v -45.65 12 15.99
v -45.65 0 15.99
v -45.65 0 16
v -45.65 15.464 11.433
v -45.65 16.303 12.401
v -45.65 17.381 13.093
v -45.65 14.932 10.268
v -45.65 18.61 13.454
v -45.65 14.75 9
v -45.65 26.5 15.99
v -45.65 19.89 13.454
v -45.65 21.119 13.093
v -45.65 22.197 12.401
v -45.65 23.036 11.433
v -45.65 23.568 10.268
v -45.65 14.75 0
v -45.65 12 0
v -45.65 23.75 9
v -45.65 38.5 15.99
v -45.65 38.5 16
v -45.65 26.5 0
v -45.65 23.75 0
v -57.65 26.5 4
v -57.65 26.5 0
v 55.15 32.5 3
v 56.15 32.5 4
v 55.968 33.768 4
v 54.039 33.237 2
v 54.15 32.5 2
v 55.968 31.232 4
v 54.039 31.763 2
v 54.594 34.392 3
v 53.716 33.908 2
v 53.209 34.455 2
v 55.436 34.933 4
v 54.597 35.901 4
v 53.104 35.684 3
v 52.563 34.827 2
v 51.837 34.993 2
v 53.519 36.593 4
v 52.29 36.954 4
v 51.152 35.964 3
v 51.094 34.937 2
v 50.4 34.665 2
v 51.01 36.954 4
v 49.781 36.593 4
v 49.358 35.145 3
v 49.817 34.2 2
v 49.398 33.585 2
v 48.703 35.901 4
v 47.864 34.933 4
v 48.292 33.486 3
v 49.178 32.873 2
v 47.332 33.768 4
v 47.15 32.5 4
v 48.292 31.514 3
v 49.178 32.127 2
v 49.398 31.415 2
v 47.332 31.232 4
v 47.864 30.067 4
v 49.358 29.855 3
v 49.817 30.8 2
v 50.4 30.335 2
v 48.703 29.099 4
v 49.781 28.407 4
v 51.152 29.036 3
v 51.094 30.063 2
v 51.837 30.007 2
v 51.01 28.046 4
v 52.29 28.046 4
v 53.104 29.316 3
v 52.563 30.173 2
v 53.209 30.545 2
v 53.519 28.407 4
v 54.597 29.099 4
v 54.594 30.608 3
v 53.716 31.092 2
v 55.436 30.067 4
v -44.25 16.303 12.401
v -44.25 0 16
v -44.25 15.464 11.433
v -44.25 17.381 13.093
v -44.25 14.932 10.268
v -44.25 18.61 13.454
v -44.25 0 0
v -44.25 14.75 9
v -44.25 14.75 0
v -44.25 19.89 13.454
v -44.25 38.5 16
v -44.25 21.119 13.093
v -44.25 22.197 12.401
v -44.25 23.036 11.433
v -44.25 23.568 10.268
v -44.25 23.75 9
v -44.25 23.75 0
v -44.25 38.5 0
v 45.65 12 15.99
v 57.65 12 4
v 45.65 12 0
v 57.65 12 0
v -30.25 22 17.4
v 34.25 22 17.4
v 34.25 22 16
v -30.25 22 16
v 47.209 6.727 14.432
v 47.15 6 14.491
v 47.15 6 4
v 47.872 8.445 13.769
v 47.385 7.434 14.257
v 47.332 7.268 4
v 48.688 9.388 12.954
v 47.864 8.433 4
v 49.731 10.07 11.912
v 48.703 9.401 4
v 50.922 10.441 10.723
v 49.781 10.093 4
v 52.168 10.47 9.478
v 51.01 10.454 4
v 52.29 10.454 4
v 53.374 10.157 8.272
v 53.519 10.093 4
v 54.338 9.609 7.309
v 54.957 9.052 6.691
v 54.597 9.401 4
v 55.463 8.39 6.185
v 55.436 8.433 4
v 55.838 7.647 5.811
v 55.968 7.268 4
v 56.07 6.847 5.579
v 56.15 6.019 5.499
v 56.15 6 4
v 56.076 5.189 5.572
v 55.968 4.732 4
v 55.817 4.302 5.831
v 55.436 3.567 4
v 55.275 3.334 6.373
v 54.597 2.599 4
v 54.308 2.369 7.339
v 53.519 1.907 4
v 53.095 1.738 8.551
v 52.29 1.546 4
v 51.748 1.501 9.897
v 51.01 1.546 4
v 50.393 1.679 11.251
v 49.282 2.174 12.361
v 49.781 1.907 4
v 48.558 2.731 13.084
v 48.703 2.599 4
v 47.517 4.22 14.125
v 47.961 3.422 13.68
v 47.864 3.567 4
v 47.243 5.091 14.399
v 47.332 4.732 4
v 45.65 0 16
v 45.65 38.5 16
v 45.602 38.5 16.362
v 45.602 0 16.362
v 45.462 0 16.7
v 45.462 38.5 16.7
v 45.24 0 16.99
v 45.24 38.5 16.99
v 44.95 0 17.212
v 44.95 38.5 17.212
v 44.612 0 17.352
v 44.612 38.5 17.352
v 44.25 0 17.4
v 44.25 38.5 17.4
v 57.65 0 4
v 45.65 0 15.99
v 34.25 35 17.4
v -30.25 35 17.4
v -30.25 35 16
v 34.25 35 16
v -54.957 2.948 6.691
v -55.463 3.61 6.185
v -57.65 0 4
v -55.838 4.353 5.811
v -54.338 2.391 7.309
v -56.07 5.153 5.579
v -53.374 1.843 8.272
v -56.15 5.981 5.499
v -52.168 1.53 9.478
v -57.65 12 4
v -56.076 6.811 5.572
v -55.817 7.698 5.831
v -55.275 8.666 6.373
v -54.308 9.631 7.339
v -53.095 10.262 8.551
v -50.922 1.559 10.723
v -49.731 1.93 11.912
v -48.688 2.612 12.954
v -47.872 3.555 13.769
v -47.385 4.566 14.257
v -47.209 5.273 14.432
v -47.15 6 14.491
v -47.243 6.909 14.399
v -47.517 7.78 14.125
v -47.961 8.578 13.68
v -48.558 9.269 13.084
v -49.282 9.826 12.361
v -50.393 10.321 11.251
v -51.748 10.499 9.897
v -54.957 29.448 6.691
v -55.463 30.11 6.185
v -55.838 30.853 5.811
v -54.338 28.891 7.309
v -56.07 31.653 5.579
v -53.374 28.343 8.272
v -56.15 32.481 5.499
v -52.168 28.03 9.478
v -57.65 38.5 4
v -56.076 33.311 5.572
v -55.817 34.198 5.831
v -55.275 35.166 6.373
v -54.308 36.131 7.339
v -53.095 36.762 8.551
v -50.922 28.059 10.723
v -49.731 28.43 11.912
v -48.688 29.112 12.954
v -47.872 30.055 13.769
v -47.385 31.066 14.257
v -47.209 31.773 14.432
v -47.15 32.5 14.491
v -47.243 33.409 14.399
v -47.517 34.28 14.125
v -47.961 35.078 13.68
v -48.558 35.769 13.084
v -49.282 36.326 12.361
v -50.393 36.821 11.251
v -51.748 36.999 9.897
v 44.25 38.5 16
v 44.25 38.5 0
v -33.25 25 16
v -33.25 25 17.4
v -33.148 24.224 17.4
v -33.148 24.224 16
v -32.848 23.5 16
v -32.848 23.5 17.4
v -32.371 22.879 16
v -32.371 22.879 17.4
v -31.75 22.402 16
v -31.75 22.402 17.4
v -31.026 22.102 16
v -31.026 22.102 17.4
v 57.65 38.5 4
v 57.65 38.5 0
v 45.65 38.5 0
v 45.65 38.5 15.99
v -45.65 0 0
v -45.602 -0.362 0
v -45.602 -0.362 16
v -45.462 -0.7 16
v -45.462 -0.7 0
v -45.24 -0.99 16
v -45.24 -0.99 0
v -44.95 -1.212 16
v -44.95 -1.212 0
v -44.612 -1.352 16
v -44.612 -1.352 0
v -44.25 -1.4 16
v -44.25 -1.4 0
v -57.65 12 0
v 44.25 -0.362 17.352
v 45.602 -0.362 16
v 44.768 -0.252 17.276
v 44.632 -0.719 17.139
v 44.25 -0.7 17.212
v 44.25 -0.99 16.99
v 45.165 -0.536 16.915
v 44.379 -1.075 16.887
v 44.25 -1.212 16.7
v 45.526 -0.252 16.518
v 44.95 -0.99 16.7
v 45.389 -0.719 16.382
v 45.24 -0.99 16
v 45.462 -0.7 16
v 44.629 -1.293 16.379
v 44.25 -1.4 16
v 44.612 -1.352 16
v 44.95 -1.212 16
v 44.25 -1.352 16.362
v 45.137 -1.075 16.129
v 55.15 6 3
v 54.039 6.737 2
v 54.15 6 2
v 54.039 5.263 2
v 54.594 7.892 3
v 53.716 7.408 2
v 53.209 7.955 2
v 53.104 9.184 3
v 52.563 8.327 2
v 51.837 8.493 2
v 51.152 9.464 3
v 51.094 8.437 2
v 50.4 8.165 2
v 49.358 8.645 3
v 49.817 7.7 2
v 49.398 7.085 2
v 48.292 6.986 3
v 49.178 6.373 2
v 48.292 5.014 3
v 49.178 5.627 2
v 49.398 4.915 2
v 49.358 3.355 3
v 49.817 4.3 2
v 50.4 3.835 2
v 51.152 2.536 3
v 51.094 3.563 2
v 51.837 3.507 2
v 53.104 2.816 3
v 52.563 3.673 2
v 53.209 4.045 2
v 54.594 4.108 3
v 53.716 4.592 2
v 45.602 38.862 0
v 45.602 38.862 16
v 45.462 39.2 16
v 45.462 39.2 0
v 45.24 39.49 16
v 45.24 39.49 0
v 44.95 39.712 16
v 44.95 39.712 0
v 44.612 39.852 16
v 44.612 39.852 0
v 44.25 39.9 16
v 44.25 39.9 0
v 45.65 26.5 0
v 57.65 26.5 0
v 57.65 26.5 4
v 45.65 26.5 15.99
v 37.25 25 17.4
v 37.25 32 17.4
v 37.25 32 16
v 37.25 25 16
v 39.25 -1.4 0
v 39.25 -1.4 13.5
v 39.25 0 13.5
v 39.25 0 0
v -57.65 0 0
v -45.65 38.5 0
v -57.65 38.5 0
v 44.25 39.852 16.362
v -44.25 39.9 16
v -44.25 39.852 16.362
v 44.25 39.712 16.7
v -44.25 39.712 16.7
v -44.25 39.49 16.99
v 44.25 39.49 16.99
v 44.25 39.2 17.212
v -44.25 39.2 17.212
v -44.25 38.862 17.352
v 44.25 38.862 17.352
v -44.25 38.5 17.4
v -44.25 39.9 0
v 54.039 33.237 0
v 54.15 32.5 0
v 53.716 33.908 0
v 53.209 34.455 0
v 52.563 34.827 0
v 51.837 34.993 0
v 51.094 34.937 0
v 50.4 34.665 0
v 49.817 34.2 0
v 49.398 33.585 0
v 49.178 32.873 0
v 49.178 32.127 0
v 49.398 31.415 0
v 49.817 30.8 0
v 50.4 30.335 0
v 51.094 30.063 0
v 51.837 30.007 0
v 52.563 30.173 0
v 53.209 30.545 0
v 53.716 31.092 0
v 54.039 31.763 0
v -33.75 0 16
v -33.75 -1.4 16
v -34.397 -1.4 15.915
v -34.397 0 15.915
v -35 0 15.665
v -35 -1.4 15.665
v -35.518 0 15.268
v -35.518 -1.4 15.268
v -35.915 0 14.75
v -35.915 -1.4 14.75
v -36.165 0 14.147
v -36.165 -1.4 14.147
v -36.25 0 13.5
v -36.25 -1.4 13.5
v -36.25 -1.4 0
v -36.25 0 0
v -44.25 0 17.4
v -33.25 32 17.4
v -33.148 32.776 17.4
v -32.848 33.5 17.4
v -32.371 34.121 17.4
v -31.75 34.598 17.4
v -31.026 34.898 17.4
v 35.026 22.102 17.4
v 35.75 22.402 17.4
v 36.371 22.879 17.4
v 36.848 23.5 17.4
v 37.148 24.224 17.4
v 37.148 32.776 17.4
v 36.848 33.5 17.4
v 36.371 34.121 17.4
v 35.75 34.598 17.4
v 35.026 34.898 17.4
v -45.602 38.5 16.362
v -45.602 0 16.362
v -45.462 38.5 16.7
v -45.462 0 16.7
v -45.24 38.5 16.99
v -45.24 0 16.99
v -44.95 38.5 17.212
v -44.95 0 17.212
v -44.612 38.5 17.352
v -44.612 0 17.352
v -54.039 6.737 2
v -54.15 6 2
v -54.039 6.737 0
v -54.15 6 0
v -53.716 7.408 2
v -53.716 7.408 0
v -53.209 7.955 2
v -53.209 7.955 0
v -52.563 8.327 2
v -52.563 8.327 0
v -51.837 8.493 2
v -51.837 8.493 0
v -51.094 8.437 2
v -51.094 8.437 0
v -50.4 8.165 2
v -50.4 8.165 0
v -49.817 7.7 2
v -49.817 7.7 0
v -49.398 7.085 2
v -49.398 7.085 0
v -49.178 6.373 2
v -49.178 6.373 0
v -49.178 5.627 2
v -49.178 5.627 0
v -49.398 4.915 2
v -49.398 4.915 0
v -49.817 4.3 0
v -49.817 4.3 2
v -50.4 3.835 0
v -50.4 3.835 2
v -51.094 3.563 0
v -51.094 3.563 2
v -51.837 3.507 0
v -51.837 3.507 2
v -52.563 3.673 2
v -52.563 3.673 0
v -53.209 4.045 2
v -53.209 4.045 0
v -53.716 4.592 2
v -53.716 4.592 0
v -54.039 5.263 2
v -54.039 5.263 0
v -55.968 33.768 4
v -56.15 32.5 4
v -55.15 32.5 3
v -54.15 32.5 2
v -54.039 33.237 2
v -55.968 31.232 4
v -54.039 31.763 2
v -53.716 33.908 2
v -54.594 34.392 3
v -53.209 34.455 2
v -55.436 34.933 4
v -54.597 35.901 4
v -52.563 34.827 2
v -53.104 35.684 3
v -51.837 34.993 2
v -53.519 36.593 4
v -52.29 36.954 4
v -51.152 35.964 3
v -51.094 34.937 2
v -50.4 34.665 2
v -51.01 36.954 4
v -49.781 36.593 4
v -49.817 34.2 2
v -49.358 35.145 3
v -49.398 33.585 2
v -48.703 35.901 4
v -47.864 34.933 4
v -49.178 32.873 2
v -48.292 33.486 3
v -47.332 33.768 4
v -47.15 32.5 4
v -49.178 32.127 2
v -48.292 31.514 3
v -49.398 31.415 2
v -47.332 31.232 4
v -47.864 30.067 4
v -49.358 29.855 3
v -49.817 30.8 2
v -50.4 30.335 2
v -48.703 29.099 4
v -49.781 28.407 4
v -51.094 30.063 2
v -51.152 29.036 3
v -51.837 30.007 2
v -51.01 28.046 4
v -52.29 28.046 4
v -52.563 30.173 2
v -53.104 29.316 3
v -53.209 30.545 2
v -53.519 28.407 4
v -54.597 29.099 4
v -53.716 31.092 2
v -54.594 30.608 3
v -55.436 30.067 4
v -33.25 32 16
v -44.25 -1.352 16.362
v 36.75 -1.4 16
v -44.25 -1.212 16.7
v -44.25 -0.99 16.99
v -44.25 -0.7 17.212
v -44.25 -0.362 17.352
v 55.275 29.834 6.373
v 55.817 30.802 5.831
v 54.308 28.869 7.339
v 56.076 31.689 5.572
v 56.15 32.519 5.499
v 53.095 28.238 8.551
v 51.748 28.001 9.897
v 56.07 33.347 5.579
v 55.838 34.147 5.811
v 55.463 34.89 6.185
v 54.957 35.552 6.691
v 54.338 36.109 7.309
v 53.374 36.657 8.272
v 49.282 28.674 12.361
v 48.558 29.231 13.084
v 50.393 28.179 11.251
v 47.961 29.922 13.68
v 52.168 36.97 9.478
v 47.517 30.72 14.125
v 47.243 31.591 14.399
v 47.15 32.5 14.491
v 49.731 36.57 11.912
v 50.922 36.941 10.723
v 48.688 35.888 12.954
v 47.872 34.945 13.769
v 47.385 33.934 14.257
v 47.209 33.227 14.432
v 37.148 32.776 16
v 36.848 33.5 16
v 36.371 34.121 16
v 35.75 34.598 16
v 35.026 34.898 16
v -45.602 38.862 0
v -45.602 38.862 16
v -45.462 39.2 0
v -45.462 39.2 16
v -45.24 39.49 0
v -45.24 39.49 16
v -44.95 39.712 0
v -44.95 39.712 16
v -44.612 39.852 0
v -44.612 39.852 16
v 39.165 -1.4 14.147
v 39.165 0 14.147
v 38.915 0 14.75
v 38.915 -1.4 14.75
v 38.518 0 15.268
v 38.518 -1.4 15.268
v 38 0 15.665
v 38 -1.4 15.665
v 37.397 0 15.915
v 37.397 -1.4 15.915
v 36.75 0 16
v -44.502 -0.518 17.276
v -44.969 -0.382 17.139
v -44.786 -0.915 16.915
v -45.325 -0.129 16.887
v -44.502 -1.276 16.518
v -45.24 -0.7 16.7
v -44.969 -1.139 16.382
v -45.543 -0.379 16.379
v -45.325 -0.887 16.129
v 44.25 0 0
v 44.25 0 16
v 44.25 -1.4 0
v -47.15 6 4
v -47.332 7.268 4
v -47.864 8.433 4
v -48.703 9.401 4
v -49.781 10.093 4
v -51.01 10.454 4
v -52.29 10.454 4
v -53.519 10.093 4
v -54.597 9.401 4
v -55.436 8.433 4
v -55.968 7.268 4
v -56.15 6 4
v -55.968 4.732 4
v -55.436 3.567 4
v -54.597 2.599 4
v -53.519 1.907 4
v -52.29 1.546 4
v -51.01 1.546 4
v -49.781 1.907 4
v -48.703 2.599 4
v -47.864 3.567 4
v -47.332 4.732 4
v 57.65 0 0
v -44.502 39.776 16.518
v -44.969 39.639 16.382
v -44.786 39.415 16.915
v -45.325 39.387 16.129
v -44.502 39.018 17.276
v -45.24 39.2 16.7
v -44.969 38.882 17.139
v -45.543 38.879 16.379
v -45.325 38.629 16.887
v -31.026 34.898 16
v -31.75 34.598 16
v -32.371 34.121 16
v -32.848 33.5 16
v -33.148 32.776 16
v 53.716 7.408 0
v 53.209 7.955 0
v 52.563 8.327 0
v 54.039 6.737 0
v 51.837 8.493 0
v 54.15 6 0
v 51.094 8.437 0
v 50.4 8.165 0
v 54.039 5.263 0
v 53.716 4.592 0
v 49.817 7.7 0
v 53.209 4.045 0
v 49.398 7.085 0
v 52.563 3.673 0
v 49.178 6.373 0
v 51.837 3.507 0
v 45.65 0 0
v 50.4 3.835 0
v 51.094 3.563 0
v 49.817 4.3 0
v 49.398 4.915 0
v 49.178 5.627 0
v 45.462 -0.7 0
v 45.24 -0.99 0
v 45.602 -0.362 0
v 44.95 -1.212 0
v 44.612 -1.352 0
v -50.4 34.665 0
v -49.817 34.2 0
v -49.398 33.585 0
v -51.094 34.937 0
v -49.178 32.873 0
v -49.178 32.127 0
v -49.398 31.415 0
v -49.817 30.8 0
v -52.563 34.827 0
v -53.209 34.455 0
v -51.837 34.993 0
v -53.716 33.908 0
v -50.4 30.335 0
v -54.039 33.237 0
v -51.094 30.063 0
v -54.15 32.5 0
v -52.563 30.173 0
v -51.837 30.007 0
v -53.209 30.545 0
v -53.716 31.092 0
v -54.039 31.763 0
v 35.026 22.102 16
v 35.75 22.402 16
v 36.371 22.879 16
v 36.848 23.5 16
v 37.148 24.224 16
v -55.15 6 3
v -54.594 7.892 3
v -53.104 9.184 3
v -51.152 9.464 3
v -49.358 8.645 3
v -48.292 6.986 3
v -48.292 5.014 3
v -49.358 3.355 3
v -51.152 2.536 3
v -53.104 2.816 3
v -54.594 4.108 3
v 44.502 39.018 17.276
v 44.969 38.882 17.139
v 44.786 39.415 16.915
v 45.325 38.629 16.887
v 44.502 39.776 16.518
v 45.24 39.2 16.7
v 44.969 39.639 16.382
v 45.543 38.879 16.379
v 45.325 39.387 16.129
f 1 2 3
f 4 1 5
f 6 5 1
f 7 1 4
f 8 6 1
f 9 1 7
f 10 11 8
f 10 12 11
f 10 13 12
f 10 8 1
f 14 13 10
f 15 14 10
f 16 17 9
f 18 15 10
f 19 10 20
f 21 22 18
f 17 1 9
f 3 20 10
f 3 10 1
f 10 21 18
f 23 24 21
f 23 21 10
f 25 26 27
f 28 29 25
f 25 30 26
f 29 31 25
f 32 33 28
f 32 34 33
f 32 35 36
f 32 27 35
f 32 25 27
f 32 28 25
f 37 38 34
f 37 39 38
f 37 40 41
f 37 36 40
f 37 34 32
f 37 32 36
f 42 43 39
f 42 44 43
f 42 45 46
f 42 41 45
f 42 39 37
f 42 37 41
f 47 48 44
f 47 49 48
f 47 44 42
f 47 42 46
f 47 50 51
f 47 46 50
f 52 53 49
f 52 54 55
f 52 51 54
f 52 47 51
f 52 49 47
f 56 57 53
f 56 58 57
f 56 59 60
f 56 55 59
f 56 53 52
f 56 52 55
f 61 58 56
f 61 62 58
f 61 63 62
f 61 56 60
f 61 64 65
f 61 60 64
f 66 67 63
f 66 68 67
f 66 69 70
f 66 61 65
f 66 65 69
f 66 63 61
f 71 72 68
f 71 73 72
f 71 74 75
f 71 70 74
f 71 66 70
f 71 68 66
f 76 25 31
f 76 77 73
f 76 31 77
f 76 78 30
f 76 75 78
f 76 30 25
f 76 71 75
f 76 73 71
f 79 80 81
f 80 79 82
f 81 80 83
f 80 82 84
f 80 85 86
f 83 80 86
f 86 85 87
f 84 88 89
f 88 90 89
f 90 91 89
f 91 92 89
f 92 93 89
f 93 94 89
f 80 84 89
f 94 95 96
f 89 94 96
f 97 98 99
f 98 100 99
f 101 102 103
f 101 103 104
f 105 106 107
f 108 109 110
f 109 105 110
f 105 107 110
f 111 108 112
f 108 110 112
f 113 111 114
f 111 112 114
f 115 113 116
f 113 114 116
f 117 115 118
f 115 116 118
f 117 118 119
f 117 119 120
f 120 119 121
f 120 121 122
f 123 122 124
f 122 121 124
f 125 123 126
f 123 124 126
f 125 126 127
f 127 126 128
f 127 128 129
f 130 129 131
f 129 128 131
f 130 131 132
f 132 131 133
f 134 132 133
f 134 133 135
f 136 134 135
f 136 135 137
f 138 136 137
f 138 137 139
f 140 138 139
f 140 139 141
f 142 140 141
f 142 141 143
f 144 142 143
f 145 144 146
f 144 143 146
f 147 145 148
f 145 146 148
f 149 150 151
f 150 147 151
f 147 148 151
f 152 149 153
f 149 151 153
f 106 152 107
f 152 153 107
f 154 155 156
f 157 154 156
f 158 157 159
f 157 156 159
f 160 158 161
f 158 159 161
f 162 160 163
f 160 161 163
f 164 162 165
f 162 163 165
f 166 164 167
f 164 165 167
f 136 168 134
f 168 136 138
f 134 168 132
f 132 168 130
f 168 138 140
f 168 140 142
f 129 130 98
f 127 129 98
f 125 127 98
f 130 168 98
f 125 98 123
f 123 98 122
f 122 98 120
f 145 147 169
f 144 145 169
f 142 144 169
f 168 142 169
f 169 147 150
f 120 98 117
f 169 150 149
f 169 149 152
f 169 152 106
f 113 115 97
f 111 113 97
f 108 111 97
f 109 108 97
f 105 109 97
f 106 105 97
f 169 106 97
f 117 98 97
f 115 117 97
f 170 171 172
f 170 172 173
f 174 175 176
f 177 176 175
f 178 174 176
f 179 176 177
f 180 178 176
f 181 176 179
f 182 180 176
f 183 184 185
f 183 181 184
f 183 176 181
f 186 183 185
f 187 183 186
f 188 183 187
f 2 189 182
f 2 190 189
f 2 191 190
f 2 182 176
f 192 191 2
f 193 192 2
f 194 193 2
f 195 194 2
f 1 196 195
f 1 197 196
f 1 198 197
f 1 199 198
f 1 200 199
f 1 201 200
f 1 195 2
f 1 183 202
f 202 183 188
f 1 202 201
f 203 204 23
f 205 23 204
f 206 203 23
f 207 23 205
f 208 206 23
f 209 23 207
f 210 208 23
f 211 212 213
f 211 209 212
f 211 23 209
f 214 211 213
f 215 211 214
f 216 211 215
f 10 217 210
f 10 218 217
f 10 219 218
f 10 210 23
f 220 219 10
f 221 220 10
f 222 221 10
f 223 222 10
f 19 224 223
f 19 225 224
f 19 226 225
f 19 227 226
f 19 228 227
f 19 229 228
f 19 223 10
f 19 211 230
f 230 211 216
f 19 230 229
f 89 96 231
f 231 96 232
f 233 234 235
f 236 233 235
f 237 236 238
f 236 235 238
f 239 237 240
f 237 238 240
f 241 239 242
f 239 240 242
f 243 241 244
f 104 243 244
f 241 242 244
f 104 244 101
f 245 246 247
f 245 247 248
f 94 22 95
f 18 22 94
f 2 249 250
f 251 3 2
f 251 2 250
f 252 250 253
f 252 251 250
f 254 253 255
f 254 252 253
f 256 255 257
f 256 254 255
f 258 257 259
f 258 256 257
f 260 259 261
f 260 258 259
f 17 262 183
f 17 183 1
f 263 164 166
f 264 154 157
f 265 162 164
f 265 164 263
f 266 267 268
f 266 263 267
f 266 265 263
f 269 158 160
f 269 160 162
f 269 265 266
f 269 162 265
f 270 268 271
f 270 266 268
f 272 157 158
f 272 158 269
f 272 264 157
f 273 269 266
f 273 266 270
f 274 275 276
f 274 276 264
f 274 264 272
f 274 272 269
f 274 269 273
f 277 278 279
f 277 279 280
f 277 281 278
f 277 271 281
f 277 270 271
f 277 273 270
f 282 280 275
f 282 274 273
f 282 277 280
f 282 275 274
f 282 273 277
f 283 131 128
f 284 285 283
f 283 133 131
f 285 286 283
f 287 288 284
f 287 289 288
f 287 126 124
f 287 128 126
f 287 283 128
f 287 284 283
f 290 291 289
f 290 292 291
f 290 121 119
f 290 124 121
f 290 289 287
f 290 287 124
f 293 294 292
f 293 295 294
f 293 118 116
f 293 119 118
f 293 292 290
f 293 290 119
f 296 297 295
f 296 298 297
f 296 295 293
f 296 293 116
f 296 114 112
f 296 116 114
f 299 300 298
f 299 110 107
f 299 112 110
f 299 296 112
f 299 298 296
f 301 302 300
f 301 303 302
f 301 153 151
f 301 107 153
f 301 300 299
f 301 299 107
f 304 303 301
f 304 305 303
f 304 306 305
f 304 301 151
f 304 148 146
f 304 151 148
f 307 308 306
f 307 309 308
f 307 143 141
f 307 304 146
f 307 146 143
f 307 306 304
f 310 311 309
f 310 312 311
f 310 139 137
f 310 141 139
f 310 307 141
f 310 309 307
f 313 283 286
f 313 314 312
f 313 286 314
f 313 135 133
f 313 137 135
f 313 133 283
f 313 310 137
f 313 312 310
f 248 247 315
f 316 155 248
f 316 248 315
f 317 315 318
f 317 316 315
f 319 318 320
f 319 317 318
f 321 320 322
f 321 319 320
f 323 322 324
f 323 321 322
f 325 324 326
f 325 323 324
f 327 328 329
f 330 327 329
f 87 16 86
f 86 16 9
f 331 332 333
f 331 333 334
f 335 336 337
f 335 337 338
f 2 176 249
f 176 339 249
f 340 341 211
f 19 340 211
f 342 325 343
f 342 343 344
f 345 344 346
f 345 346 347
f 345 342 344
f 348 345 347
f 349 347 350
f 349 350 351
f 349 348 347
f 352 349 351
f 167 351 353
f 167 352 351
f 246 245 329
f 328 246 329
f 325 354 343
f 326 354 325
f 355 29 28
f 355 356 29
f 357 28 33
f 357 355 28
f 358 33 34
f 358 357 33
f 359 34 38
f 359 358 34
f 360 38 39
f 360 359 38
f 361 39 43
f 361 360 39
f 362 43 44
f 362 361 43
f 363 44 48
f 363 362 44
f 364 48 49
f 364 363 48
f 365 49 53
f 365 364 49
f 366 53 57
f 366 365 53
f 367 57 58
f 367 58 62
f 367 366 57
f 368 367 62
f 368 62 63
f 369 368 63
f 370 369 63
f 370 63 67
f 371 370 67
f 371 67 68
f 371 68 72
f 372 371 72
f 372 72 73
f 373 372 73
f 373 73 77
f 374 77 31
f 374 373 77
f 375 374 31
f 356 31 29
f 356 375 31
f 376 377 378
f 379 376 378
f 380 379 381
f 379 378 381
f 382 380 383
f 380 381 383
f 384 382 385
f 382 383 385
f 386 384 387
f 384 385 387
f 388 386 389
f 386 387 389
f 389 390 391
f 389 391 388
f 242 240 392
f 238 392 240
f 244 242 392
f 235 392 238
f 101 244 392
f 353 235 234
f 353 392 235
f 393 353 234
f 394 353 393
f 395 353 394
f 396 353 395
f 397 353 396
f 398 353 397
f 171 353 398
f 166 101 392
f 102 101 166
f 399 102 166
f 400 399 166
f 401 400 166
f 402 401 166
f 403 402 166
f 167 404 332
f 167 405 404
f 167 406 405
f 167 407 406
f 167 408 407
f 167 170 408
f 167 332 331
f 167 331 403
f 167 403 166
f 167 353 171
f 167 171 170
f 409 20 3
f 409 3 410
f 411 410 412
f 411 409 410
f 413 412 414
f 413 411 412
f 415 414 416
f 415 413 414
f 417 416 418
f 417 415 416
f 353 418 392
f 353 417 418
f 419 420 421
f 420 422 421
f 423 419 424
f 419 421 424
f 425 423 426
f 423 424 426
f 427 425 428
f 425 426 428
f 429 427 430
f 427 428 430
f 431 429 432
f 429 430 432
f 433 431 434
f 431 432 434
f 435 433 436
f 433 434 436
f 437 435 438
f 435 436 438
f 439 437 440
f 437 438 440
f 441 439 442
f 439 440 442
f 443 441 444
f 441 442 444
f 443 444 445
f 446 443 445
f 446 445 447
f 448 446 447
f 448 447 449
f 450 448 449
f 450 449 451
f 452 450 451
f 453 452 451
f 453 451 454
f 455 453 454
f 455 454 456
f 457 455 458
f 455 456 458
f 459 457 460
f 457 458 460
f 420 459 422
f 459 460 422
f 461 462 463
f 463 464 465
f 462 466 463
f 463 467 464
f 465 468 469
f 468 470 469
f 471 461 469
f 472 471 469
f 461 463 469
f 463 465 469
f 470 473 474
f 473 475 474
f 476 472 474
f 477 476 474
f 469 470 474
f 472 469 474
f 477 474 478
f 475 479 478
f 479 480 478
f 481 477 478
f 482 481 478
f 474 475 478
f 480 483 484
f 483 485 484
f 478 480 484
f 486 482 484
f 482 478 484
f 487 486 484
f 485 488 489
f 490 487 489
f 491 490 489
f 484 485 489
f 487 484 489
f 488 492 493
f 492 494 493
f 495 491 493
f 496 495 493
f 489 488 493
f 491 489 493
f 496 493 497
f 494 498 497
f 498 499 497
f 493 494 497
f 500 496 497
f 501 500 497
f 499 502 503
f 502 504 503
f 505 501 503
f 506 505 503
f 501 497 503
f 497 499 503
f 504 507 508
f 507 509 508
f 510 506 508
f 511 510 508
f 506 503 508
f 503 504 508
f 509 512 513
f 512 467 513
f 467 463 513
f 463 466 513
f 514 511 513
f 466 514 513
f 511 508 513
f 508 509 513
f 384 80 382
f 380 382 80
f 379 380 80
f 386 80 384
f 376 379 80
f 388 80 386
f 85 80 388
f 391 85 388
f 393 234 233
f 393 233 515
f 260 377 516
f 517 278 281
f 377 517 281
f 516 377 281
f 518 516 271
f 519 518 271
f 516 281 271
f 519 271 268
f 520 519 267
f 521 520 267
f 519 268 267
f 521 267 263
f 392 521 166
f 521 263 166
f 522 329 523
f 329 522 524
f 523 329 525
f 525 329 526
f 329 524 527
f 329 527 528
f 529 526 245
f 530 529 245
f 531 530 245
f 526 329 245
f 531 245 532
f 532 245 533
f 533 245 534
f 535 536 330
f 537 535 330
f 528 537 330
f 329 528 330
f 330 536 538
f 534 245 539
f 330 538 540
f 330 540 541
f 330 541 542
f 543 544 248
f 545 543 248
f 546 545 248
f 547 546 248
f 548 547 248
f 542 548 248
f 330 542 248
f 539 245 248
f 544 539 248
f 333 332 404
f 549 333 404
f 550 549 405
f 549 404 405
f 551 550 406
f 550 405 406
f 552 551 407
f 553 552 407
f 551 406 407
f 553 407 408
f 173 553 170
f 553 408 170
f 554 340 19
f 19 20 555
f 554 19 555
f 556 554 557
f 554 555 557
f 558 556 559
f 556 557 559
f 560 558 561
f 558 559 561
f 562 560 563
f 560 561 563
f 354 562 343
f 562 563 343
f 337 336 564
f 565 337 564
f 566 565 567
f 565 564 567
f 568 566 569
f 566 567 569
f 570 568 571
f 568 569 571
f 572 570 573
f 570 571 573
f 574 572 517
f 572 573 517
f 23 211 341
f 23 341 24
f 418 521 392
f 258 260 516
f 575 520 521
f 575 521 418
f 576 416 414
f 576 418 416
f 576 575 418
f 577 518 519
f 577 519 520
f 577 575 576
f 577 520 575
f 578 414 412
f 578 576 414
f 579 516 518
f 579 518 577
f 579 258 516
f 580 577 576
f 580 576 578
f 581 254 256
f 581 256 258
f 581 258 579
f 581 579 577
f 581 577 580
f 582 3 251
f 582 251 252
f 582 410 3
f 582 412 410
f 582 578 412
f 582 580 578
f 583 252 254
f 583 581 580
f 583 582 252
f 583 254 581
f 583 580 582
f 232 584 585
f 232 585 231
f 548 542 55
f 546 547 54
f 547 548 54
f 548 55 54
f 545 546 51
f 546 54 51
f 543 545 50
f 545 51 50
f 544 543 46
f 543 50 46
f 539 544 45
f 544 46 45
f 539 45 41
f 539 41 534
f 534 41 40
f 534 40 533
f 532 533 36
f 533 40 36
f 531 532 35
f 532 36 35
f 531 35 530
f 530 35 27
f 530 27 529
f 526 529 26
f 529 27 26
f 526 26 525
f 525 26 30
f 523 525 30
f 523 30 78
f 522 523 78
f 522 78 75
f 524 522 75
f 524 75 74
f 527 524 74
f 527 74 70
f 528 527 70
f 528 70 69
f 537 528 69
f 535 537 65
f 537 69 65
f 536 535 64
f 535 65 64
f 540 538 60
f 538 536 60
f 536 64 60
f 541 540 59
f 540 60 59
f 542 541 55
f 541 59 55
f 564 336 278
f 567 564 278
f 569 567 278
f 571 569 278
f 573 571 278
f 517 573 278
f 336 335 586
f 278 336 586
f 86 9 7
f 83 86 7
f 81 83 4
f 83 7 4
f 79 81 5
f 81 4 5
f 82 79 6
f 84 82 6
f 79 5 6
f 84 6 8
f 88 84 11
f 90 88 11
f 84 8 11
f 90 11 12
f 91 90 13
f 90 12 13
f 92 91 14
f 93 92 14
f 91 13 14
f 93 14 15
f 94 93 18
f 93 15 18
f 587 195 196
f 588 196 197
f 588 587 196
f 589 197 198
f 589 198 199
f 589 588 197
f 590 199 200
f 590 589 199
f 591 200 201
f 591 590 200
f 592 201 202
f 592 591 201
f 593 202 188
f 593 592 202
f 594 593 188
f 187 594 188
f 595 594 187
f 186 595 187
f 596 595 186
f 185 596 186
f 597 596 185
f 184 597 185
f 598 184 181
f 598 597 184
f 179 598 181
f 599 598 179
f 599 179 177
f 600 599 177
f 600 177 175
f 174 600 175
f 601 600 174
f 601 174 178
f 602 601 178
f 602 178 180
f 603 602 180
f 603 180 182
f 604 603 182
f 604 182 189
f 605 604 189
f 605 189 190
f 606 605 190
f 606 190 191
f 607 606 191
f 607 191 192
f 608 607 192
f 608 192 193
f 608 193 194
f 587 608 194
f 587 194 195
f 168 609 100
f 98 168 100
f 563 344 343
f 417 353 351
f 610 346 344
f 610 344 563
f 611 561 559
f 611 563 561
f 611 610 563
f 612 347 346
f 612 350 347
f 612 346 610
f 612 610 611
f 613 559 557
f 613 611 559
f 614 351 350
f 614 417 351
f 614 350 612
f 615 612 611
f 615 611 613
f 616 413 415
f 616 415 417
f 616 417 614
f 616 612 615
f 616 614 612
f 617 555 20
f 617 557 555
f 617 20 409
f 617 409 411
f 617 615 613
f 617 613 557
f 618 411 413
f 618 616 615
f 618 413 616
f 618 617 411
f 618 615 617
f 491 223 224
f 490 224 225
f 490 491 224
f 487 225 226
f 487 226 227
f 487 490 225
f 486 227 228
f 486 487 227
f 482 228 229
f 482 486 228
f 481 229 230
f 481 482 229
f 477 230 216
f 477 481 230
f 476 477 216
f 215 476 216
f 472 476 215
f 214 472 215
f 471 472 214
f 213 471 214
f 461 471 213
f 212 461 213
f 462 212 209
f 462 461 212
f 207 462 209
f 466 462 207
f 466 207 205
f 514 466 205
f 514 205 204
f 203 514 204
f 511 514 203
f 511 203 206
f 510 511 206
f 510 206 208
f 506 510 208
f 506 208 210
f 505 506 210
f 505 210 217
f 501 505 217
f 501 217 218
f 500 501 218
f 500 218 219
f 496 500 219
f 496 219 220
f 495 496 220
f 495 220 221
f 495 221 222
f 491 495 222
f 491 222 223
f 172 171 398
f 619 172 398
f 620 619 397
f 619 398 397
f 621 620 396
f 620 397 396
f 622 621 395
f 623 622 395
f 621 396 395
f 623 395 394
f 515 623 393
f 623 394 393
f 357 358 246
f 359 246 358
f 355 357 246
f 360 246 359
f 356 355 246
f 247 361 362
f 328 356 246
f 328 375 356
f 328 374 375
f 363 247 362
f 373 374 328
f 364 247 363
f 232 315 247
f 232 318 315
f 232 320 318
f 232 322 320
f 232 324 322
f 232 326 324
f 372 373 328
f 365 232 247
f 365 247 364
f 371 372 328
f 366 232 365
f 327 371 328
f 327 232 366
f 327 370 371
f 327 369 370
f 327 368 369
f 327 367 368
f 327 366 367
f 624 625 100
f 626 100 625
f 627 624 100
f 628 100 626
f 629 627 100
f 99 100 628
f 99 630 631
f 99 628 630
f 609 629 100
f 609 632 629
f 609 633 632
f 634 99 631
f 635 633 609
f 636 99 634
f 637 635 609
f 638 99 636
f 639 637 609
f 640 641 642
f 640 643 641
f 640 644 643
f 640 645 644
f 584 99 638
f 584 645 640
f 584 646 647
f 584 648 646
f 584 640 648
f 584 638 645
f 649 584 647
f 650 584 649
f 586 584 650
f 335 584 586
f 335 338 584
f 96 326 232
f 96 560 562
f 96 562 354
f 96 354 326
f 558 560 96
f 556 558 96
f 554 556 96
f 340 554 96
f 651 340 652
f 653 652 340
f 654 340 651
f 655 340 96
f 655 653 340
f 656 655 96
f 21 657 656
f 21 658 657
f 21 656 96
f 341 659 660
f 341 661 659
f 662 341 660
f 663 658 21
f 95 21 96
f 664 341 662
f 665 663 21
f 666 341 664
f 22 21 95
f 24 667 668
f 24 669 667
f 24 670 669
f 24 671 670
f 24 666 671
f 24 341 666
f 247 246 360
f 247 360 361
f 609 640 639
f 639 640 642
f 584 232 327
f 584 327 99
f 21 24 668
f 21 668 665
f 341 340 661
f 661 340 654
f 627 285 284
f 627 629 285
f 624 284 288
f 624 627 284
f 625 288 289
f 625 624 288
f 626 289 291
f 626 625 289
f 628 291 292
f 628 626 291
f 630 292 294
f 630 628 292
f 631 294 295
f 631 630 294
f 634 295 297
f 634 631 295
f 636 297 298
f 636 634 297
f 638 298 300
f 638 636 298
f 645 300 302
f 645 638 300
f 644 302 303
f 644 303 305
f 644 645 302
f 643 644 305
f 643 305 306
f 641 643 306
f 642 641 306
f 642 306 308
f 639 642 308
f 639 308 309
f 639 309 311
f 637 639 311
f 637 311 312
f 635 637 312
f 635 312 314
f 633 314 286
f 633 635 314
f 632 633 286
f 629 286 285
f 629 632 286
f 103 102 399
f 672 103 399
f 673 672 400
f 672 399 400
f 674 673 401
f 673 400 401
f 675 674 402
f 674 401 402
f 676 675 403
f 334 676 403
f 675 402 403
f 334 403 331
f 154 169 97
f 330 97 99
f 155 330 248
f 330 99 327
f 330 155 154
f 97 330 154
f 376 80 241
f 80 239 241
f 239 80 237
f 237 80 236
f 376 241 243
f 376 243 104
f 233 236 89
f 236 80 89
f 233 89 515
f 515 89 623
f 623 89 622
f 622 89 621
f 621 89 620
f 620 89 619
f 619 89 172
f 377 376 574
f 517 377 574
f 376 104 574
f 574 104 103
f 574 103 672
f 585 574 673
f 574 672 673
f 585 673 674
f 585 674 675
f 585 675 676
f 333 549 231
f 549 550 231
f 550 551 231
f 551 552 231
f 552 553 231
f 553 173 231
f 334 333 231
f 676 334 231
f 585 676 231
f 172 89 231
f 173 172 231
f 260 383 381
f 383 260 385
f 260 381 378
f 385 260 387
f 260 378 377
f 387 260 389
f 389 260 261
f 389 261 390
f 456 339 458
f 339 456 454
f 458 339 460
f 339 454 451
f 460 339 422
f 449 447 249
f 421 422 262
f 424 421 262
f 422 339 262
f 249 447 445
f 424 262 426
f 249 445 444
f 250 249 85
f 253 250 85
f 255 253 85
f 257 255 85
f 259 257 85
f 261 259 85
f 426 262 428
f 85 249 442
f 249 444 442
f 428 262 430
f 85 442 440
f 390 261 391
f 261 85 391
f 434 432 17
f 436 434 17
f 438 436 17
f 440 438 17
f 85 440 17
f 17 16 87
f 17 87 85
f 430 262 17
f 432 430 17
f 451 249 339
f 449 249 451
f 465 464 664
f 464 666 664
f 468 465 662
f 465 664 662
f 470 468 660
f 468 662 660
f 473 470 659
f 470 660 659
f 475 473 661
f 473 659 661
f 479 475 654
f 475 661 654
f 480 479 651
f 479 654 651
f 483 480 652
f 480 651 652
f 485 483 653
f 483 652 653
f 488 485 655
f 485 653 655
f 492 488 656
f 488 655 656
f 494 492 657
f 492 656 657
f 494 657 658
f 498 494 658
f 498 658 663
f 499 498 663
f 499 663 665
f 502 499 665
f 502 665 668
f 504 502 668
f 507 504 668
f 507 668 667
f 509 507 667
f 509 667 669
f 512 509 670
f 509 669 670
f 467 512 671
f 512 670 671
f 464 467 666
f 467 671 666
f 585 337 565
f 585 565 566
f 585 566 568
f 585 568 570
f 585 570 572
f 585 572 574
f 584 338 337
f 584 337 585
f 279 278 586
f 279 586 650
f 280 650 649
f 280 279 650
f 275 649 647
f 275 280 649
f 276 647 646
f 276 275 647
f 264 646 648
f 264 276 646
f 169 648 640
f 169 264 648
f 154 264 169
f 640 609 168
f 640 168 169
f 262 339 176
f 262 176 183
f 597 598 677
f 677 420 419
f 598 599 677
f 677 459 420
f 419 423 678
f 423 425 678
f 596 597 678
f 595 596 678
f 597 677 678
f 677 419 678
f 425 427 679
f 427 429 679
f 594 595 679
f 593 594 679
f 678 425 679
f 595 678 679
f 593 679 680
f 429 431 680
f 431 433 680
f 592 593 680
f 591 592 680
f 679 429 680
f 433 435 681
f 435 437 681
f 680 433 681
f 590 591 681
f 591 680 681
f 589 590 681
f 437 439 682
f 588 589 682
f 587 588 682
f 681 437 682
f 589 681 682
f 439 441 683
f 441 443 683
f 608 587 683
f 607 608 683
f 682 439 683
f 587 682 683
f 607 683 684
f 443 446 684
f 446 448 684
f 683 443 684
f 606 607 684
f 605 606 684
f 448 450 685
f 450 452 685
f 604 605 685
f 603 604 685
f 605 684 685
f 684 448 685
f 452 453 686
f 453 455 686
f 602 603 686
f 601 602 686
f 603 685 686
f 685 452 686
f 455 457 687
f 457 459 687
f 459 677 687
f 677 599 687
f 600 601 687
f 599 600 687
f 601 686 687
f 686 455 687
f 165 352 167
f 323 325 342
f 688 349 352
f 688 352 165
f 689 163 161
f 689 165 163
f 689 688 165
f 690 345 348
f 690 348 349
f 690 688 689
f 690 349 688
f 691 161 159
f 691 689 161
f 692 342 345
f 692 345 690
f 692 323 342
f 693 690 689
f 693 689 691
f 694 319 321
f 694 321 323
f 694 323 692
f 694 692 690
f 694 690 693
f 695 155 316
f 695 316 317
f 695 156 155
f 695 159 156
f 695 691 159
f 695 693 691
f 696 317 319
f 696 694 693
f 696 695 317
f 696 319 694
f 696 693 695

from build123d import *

# Parameters (mm, degrees)
SKETCH_W         = 88.5
SKETCH_H         = 38.5
PAD_DEPTH        = 16
THICKNESS_T      = 1.4
POCKET_DEPTH     = 1.4
POCKET001_DEPTH  = 5
POCKET002_DEPTH  = 5
SKETCH004_W      = 12
SKETCH004_H      = 4
PAD001_DEPTH     = 12
HOLE_D           = 5
HOLE_DEPTH       = 25
HOLE_CSINK_D     = 9
HOLE_CSINK_ANGLE = 90
SKETCH006_W      = 12
SKETCH006_H      = 12
SKETCH006_R      = 4.5
PAD002_DEPTH     = 11.99
POCKET003_DEPTH  = 265.106151


with BuildPart() as part:
    # Sketch → Pad (new body)
    with BuildSketch(Plane.XY):
        with Locations((0, 19.25)):
            Rectangle(SKETCH_W, SKETCH_H)
    extrude(amount=PAD_DEPTH)

    # Thickness
    thickness_openings = [part.faces().sort_by_distance(p)[0] for p in [
        (0, 19.25, 0),
    ]]
    offset(amount=THICKNESS_T, openings=thickness_openings)

    # Sketch001 (on Face14 of Thickness) → Pocket (cut)
    with BuildSketch(Plane(origin=(-45.65, 0, 0), x_dir=(0, -1, 0), z_dir=(-1, 0, 0))):
        with BuildLine():
            Line((-23.75, 0), (-23.75, 9))
            ThreePointArc((-14.75, 9), (-19.25, 13.5), (-23.75, 9))
            Line((-14.75, 0), (-14.75, 9))
            Line((-23.75, 0), (-14.75, 0))
        make_face()
    extrude(amount=-POCKET_DEPTH, mode=Mode.SUBTRACT)

    # Sketch002 (on Face26 of Pocket) → Pocket001 (cut)
    with BuildSketch(Plane.XY.offset(17.4)):
        with BuildLine():
            ThreePointArc((-30.25, 35), (-32.37132, 34.12132), (-33.25, 32))
            Line((-33.25, 25), (-33.25, 32))
            ThreePointArc((-33.25, 25), (-32.37132, 22.87868), (-30.25, 22))
            Line((34.25, 22), (-30.25, 22))
            ThreePointArc((34.25, 22), (36.37132, 22.87868), (37.25, 25))
            Line((37.25, 32), (37.25, 25))
            ThreePointArc((37.25, 32), (36.37132, 34.12132), (34.25, 35))
            Line((-30.25, 35), (34.25, 35))
        make_face()
    extrude(amount=-POCKET001_DEPTH, mode=Mode.SUBTRACT)

    # Sketch003 (on Face16 of Pocket001) → Pocket002 (cut)
    with BuildSketch(Plane.XZ.offset(1.4)):
        with BuildLine():
            Line((39.25, 0), (-36.25, 0))
            Line((-36.25, 0), (-36.25, 13.5))
            ThreePointArc((-33.75, 16), (-35.517767, 15.267767), (-36.25, 13.5))
            Line((-33.75, 16), (36.75, 16))
            ThreePointArc((39.25, 13.5), (38.517767, 15.267767), (36.75, 16))
            Line((39.25, 13.5), (39.25, 0))
        make_face()
    extrude(amount=-POCKET002_DEPTH, mode=Mode.SUBTRACT)

    # Sketch004 (on Face9 of Pocket002) → Pad001 (join)
    with BuildSketch(Plane(origin=(-45.65, 0, 0), x_dir=(0, -1, 0), z_dir=(-1, 0, 0))):
        with Locations((-32.5, 2)):
            Rectangle(SKETCH004_W, SKETCH004_H)
        with Locations((-6, 2)):
            Rectangle(SKETCH004_W, SKETCH004_H)
    pad001 = extrude(amount=PAD001_DEPTH)

    # Hole
    with Locations(Plane.XY.offset(4)):
        with Locations((-51.65, 32.5), (-51.65, 6)):
            hole = CounterSinkHole(HOLE_D / 2, HOLE_CSINK_D / 2, depth=HOLE_DEPTH, counter_sink_angle=HOLE_CSINK_ANGLE)

    # Sketch006 (on Face35 of Hole) → Pad002 (join)
    with BuildSketch(Plane.XY.offset(4)):
        with Locations((-51.65, 6)):
            Rectangle(SKETCH006_W, SKETCH006_H)
        with Locations((-51.65, 6)):
            Circle(SKETCH006_R, mode=Mode.SUBTRACT)
        with Locations((-51.65, 32.5)):
            Rectangle(SKETCH006_W, SKETCH006_H)
        with Locations((-51.65, 32.5)):
            Circle(SKETCH006_R, mode=Mode.SUBTRACT)
    pad002 = extrude(amount=PAD002_DEPTH)

    # Sketch007 (on Face56 of Pad002) → Pocket003 (cut, through all)
    with BuildSketch(Plane(origin=(0, 38.5, 0), x_dir=(-1, 0, 0), z_dir=(0, 1, 0))):
        Polygon((45.65, 15.99), (57.65, 15.99), (57.65, 4), align=None)
    pocket003 = extrude(amount=-POCKET003_DEPTH, mode=Mode.SUBTRACT)

    # Mirrored: Pad001, Hole, Pad002, Pocket003 across YZ
    add(pad001.mirror(Plane.YZ))
    add(hole.mirror(Plane.YZ), mode=Mode.SUBTRACT)
    add(pad002.mirror(Plane.YZ))
    add(pocket003.mirror(Plane.YZ), mode=Mode.SUBTRACT)


solid = part.part
